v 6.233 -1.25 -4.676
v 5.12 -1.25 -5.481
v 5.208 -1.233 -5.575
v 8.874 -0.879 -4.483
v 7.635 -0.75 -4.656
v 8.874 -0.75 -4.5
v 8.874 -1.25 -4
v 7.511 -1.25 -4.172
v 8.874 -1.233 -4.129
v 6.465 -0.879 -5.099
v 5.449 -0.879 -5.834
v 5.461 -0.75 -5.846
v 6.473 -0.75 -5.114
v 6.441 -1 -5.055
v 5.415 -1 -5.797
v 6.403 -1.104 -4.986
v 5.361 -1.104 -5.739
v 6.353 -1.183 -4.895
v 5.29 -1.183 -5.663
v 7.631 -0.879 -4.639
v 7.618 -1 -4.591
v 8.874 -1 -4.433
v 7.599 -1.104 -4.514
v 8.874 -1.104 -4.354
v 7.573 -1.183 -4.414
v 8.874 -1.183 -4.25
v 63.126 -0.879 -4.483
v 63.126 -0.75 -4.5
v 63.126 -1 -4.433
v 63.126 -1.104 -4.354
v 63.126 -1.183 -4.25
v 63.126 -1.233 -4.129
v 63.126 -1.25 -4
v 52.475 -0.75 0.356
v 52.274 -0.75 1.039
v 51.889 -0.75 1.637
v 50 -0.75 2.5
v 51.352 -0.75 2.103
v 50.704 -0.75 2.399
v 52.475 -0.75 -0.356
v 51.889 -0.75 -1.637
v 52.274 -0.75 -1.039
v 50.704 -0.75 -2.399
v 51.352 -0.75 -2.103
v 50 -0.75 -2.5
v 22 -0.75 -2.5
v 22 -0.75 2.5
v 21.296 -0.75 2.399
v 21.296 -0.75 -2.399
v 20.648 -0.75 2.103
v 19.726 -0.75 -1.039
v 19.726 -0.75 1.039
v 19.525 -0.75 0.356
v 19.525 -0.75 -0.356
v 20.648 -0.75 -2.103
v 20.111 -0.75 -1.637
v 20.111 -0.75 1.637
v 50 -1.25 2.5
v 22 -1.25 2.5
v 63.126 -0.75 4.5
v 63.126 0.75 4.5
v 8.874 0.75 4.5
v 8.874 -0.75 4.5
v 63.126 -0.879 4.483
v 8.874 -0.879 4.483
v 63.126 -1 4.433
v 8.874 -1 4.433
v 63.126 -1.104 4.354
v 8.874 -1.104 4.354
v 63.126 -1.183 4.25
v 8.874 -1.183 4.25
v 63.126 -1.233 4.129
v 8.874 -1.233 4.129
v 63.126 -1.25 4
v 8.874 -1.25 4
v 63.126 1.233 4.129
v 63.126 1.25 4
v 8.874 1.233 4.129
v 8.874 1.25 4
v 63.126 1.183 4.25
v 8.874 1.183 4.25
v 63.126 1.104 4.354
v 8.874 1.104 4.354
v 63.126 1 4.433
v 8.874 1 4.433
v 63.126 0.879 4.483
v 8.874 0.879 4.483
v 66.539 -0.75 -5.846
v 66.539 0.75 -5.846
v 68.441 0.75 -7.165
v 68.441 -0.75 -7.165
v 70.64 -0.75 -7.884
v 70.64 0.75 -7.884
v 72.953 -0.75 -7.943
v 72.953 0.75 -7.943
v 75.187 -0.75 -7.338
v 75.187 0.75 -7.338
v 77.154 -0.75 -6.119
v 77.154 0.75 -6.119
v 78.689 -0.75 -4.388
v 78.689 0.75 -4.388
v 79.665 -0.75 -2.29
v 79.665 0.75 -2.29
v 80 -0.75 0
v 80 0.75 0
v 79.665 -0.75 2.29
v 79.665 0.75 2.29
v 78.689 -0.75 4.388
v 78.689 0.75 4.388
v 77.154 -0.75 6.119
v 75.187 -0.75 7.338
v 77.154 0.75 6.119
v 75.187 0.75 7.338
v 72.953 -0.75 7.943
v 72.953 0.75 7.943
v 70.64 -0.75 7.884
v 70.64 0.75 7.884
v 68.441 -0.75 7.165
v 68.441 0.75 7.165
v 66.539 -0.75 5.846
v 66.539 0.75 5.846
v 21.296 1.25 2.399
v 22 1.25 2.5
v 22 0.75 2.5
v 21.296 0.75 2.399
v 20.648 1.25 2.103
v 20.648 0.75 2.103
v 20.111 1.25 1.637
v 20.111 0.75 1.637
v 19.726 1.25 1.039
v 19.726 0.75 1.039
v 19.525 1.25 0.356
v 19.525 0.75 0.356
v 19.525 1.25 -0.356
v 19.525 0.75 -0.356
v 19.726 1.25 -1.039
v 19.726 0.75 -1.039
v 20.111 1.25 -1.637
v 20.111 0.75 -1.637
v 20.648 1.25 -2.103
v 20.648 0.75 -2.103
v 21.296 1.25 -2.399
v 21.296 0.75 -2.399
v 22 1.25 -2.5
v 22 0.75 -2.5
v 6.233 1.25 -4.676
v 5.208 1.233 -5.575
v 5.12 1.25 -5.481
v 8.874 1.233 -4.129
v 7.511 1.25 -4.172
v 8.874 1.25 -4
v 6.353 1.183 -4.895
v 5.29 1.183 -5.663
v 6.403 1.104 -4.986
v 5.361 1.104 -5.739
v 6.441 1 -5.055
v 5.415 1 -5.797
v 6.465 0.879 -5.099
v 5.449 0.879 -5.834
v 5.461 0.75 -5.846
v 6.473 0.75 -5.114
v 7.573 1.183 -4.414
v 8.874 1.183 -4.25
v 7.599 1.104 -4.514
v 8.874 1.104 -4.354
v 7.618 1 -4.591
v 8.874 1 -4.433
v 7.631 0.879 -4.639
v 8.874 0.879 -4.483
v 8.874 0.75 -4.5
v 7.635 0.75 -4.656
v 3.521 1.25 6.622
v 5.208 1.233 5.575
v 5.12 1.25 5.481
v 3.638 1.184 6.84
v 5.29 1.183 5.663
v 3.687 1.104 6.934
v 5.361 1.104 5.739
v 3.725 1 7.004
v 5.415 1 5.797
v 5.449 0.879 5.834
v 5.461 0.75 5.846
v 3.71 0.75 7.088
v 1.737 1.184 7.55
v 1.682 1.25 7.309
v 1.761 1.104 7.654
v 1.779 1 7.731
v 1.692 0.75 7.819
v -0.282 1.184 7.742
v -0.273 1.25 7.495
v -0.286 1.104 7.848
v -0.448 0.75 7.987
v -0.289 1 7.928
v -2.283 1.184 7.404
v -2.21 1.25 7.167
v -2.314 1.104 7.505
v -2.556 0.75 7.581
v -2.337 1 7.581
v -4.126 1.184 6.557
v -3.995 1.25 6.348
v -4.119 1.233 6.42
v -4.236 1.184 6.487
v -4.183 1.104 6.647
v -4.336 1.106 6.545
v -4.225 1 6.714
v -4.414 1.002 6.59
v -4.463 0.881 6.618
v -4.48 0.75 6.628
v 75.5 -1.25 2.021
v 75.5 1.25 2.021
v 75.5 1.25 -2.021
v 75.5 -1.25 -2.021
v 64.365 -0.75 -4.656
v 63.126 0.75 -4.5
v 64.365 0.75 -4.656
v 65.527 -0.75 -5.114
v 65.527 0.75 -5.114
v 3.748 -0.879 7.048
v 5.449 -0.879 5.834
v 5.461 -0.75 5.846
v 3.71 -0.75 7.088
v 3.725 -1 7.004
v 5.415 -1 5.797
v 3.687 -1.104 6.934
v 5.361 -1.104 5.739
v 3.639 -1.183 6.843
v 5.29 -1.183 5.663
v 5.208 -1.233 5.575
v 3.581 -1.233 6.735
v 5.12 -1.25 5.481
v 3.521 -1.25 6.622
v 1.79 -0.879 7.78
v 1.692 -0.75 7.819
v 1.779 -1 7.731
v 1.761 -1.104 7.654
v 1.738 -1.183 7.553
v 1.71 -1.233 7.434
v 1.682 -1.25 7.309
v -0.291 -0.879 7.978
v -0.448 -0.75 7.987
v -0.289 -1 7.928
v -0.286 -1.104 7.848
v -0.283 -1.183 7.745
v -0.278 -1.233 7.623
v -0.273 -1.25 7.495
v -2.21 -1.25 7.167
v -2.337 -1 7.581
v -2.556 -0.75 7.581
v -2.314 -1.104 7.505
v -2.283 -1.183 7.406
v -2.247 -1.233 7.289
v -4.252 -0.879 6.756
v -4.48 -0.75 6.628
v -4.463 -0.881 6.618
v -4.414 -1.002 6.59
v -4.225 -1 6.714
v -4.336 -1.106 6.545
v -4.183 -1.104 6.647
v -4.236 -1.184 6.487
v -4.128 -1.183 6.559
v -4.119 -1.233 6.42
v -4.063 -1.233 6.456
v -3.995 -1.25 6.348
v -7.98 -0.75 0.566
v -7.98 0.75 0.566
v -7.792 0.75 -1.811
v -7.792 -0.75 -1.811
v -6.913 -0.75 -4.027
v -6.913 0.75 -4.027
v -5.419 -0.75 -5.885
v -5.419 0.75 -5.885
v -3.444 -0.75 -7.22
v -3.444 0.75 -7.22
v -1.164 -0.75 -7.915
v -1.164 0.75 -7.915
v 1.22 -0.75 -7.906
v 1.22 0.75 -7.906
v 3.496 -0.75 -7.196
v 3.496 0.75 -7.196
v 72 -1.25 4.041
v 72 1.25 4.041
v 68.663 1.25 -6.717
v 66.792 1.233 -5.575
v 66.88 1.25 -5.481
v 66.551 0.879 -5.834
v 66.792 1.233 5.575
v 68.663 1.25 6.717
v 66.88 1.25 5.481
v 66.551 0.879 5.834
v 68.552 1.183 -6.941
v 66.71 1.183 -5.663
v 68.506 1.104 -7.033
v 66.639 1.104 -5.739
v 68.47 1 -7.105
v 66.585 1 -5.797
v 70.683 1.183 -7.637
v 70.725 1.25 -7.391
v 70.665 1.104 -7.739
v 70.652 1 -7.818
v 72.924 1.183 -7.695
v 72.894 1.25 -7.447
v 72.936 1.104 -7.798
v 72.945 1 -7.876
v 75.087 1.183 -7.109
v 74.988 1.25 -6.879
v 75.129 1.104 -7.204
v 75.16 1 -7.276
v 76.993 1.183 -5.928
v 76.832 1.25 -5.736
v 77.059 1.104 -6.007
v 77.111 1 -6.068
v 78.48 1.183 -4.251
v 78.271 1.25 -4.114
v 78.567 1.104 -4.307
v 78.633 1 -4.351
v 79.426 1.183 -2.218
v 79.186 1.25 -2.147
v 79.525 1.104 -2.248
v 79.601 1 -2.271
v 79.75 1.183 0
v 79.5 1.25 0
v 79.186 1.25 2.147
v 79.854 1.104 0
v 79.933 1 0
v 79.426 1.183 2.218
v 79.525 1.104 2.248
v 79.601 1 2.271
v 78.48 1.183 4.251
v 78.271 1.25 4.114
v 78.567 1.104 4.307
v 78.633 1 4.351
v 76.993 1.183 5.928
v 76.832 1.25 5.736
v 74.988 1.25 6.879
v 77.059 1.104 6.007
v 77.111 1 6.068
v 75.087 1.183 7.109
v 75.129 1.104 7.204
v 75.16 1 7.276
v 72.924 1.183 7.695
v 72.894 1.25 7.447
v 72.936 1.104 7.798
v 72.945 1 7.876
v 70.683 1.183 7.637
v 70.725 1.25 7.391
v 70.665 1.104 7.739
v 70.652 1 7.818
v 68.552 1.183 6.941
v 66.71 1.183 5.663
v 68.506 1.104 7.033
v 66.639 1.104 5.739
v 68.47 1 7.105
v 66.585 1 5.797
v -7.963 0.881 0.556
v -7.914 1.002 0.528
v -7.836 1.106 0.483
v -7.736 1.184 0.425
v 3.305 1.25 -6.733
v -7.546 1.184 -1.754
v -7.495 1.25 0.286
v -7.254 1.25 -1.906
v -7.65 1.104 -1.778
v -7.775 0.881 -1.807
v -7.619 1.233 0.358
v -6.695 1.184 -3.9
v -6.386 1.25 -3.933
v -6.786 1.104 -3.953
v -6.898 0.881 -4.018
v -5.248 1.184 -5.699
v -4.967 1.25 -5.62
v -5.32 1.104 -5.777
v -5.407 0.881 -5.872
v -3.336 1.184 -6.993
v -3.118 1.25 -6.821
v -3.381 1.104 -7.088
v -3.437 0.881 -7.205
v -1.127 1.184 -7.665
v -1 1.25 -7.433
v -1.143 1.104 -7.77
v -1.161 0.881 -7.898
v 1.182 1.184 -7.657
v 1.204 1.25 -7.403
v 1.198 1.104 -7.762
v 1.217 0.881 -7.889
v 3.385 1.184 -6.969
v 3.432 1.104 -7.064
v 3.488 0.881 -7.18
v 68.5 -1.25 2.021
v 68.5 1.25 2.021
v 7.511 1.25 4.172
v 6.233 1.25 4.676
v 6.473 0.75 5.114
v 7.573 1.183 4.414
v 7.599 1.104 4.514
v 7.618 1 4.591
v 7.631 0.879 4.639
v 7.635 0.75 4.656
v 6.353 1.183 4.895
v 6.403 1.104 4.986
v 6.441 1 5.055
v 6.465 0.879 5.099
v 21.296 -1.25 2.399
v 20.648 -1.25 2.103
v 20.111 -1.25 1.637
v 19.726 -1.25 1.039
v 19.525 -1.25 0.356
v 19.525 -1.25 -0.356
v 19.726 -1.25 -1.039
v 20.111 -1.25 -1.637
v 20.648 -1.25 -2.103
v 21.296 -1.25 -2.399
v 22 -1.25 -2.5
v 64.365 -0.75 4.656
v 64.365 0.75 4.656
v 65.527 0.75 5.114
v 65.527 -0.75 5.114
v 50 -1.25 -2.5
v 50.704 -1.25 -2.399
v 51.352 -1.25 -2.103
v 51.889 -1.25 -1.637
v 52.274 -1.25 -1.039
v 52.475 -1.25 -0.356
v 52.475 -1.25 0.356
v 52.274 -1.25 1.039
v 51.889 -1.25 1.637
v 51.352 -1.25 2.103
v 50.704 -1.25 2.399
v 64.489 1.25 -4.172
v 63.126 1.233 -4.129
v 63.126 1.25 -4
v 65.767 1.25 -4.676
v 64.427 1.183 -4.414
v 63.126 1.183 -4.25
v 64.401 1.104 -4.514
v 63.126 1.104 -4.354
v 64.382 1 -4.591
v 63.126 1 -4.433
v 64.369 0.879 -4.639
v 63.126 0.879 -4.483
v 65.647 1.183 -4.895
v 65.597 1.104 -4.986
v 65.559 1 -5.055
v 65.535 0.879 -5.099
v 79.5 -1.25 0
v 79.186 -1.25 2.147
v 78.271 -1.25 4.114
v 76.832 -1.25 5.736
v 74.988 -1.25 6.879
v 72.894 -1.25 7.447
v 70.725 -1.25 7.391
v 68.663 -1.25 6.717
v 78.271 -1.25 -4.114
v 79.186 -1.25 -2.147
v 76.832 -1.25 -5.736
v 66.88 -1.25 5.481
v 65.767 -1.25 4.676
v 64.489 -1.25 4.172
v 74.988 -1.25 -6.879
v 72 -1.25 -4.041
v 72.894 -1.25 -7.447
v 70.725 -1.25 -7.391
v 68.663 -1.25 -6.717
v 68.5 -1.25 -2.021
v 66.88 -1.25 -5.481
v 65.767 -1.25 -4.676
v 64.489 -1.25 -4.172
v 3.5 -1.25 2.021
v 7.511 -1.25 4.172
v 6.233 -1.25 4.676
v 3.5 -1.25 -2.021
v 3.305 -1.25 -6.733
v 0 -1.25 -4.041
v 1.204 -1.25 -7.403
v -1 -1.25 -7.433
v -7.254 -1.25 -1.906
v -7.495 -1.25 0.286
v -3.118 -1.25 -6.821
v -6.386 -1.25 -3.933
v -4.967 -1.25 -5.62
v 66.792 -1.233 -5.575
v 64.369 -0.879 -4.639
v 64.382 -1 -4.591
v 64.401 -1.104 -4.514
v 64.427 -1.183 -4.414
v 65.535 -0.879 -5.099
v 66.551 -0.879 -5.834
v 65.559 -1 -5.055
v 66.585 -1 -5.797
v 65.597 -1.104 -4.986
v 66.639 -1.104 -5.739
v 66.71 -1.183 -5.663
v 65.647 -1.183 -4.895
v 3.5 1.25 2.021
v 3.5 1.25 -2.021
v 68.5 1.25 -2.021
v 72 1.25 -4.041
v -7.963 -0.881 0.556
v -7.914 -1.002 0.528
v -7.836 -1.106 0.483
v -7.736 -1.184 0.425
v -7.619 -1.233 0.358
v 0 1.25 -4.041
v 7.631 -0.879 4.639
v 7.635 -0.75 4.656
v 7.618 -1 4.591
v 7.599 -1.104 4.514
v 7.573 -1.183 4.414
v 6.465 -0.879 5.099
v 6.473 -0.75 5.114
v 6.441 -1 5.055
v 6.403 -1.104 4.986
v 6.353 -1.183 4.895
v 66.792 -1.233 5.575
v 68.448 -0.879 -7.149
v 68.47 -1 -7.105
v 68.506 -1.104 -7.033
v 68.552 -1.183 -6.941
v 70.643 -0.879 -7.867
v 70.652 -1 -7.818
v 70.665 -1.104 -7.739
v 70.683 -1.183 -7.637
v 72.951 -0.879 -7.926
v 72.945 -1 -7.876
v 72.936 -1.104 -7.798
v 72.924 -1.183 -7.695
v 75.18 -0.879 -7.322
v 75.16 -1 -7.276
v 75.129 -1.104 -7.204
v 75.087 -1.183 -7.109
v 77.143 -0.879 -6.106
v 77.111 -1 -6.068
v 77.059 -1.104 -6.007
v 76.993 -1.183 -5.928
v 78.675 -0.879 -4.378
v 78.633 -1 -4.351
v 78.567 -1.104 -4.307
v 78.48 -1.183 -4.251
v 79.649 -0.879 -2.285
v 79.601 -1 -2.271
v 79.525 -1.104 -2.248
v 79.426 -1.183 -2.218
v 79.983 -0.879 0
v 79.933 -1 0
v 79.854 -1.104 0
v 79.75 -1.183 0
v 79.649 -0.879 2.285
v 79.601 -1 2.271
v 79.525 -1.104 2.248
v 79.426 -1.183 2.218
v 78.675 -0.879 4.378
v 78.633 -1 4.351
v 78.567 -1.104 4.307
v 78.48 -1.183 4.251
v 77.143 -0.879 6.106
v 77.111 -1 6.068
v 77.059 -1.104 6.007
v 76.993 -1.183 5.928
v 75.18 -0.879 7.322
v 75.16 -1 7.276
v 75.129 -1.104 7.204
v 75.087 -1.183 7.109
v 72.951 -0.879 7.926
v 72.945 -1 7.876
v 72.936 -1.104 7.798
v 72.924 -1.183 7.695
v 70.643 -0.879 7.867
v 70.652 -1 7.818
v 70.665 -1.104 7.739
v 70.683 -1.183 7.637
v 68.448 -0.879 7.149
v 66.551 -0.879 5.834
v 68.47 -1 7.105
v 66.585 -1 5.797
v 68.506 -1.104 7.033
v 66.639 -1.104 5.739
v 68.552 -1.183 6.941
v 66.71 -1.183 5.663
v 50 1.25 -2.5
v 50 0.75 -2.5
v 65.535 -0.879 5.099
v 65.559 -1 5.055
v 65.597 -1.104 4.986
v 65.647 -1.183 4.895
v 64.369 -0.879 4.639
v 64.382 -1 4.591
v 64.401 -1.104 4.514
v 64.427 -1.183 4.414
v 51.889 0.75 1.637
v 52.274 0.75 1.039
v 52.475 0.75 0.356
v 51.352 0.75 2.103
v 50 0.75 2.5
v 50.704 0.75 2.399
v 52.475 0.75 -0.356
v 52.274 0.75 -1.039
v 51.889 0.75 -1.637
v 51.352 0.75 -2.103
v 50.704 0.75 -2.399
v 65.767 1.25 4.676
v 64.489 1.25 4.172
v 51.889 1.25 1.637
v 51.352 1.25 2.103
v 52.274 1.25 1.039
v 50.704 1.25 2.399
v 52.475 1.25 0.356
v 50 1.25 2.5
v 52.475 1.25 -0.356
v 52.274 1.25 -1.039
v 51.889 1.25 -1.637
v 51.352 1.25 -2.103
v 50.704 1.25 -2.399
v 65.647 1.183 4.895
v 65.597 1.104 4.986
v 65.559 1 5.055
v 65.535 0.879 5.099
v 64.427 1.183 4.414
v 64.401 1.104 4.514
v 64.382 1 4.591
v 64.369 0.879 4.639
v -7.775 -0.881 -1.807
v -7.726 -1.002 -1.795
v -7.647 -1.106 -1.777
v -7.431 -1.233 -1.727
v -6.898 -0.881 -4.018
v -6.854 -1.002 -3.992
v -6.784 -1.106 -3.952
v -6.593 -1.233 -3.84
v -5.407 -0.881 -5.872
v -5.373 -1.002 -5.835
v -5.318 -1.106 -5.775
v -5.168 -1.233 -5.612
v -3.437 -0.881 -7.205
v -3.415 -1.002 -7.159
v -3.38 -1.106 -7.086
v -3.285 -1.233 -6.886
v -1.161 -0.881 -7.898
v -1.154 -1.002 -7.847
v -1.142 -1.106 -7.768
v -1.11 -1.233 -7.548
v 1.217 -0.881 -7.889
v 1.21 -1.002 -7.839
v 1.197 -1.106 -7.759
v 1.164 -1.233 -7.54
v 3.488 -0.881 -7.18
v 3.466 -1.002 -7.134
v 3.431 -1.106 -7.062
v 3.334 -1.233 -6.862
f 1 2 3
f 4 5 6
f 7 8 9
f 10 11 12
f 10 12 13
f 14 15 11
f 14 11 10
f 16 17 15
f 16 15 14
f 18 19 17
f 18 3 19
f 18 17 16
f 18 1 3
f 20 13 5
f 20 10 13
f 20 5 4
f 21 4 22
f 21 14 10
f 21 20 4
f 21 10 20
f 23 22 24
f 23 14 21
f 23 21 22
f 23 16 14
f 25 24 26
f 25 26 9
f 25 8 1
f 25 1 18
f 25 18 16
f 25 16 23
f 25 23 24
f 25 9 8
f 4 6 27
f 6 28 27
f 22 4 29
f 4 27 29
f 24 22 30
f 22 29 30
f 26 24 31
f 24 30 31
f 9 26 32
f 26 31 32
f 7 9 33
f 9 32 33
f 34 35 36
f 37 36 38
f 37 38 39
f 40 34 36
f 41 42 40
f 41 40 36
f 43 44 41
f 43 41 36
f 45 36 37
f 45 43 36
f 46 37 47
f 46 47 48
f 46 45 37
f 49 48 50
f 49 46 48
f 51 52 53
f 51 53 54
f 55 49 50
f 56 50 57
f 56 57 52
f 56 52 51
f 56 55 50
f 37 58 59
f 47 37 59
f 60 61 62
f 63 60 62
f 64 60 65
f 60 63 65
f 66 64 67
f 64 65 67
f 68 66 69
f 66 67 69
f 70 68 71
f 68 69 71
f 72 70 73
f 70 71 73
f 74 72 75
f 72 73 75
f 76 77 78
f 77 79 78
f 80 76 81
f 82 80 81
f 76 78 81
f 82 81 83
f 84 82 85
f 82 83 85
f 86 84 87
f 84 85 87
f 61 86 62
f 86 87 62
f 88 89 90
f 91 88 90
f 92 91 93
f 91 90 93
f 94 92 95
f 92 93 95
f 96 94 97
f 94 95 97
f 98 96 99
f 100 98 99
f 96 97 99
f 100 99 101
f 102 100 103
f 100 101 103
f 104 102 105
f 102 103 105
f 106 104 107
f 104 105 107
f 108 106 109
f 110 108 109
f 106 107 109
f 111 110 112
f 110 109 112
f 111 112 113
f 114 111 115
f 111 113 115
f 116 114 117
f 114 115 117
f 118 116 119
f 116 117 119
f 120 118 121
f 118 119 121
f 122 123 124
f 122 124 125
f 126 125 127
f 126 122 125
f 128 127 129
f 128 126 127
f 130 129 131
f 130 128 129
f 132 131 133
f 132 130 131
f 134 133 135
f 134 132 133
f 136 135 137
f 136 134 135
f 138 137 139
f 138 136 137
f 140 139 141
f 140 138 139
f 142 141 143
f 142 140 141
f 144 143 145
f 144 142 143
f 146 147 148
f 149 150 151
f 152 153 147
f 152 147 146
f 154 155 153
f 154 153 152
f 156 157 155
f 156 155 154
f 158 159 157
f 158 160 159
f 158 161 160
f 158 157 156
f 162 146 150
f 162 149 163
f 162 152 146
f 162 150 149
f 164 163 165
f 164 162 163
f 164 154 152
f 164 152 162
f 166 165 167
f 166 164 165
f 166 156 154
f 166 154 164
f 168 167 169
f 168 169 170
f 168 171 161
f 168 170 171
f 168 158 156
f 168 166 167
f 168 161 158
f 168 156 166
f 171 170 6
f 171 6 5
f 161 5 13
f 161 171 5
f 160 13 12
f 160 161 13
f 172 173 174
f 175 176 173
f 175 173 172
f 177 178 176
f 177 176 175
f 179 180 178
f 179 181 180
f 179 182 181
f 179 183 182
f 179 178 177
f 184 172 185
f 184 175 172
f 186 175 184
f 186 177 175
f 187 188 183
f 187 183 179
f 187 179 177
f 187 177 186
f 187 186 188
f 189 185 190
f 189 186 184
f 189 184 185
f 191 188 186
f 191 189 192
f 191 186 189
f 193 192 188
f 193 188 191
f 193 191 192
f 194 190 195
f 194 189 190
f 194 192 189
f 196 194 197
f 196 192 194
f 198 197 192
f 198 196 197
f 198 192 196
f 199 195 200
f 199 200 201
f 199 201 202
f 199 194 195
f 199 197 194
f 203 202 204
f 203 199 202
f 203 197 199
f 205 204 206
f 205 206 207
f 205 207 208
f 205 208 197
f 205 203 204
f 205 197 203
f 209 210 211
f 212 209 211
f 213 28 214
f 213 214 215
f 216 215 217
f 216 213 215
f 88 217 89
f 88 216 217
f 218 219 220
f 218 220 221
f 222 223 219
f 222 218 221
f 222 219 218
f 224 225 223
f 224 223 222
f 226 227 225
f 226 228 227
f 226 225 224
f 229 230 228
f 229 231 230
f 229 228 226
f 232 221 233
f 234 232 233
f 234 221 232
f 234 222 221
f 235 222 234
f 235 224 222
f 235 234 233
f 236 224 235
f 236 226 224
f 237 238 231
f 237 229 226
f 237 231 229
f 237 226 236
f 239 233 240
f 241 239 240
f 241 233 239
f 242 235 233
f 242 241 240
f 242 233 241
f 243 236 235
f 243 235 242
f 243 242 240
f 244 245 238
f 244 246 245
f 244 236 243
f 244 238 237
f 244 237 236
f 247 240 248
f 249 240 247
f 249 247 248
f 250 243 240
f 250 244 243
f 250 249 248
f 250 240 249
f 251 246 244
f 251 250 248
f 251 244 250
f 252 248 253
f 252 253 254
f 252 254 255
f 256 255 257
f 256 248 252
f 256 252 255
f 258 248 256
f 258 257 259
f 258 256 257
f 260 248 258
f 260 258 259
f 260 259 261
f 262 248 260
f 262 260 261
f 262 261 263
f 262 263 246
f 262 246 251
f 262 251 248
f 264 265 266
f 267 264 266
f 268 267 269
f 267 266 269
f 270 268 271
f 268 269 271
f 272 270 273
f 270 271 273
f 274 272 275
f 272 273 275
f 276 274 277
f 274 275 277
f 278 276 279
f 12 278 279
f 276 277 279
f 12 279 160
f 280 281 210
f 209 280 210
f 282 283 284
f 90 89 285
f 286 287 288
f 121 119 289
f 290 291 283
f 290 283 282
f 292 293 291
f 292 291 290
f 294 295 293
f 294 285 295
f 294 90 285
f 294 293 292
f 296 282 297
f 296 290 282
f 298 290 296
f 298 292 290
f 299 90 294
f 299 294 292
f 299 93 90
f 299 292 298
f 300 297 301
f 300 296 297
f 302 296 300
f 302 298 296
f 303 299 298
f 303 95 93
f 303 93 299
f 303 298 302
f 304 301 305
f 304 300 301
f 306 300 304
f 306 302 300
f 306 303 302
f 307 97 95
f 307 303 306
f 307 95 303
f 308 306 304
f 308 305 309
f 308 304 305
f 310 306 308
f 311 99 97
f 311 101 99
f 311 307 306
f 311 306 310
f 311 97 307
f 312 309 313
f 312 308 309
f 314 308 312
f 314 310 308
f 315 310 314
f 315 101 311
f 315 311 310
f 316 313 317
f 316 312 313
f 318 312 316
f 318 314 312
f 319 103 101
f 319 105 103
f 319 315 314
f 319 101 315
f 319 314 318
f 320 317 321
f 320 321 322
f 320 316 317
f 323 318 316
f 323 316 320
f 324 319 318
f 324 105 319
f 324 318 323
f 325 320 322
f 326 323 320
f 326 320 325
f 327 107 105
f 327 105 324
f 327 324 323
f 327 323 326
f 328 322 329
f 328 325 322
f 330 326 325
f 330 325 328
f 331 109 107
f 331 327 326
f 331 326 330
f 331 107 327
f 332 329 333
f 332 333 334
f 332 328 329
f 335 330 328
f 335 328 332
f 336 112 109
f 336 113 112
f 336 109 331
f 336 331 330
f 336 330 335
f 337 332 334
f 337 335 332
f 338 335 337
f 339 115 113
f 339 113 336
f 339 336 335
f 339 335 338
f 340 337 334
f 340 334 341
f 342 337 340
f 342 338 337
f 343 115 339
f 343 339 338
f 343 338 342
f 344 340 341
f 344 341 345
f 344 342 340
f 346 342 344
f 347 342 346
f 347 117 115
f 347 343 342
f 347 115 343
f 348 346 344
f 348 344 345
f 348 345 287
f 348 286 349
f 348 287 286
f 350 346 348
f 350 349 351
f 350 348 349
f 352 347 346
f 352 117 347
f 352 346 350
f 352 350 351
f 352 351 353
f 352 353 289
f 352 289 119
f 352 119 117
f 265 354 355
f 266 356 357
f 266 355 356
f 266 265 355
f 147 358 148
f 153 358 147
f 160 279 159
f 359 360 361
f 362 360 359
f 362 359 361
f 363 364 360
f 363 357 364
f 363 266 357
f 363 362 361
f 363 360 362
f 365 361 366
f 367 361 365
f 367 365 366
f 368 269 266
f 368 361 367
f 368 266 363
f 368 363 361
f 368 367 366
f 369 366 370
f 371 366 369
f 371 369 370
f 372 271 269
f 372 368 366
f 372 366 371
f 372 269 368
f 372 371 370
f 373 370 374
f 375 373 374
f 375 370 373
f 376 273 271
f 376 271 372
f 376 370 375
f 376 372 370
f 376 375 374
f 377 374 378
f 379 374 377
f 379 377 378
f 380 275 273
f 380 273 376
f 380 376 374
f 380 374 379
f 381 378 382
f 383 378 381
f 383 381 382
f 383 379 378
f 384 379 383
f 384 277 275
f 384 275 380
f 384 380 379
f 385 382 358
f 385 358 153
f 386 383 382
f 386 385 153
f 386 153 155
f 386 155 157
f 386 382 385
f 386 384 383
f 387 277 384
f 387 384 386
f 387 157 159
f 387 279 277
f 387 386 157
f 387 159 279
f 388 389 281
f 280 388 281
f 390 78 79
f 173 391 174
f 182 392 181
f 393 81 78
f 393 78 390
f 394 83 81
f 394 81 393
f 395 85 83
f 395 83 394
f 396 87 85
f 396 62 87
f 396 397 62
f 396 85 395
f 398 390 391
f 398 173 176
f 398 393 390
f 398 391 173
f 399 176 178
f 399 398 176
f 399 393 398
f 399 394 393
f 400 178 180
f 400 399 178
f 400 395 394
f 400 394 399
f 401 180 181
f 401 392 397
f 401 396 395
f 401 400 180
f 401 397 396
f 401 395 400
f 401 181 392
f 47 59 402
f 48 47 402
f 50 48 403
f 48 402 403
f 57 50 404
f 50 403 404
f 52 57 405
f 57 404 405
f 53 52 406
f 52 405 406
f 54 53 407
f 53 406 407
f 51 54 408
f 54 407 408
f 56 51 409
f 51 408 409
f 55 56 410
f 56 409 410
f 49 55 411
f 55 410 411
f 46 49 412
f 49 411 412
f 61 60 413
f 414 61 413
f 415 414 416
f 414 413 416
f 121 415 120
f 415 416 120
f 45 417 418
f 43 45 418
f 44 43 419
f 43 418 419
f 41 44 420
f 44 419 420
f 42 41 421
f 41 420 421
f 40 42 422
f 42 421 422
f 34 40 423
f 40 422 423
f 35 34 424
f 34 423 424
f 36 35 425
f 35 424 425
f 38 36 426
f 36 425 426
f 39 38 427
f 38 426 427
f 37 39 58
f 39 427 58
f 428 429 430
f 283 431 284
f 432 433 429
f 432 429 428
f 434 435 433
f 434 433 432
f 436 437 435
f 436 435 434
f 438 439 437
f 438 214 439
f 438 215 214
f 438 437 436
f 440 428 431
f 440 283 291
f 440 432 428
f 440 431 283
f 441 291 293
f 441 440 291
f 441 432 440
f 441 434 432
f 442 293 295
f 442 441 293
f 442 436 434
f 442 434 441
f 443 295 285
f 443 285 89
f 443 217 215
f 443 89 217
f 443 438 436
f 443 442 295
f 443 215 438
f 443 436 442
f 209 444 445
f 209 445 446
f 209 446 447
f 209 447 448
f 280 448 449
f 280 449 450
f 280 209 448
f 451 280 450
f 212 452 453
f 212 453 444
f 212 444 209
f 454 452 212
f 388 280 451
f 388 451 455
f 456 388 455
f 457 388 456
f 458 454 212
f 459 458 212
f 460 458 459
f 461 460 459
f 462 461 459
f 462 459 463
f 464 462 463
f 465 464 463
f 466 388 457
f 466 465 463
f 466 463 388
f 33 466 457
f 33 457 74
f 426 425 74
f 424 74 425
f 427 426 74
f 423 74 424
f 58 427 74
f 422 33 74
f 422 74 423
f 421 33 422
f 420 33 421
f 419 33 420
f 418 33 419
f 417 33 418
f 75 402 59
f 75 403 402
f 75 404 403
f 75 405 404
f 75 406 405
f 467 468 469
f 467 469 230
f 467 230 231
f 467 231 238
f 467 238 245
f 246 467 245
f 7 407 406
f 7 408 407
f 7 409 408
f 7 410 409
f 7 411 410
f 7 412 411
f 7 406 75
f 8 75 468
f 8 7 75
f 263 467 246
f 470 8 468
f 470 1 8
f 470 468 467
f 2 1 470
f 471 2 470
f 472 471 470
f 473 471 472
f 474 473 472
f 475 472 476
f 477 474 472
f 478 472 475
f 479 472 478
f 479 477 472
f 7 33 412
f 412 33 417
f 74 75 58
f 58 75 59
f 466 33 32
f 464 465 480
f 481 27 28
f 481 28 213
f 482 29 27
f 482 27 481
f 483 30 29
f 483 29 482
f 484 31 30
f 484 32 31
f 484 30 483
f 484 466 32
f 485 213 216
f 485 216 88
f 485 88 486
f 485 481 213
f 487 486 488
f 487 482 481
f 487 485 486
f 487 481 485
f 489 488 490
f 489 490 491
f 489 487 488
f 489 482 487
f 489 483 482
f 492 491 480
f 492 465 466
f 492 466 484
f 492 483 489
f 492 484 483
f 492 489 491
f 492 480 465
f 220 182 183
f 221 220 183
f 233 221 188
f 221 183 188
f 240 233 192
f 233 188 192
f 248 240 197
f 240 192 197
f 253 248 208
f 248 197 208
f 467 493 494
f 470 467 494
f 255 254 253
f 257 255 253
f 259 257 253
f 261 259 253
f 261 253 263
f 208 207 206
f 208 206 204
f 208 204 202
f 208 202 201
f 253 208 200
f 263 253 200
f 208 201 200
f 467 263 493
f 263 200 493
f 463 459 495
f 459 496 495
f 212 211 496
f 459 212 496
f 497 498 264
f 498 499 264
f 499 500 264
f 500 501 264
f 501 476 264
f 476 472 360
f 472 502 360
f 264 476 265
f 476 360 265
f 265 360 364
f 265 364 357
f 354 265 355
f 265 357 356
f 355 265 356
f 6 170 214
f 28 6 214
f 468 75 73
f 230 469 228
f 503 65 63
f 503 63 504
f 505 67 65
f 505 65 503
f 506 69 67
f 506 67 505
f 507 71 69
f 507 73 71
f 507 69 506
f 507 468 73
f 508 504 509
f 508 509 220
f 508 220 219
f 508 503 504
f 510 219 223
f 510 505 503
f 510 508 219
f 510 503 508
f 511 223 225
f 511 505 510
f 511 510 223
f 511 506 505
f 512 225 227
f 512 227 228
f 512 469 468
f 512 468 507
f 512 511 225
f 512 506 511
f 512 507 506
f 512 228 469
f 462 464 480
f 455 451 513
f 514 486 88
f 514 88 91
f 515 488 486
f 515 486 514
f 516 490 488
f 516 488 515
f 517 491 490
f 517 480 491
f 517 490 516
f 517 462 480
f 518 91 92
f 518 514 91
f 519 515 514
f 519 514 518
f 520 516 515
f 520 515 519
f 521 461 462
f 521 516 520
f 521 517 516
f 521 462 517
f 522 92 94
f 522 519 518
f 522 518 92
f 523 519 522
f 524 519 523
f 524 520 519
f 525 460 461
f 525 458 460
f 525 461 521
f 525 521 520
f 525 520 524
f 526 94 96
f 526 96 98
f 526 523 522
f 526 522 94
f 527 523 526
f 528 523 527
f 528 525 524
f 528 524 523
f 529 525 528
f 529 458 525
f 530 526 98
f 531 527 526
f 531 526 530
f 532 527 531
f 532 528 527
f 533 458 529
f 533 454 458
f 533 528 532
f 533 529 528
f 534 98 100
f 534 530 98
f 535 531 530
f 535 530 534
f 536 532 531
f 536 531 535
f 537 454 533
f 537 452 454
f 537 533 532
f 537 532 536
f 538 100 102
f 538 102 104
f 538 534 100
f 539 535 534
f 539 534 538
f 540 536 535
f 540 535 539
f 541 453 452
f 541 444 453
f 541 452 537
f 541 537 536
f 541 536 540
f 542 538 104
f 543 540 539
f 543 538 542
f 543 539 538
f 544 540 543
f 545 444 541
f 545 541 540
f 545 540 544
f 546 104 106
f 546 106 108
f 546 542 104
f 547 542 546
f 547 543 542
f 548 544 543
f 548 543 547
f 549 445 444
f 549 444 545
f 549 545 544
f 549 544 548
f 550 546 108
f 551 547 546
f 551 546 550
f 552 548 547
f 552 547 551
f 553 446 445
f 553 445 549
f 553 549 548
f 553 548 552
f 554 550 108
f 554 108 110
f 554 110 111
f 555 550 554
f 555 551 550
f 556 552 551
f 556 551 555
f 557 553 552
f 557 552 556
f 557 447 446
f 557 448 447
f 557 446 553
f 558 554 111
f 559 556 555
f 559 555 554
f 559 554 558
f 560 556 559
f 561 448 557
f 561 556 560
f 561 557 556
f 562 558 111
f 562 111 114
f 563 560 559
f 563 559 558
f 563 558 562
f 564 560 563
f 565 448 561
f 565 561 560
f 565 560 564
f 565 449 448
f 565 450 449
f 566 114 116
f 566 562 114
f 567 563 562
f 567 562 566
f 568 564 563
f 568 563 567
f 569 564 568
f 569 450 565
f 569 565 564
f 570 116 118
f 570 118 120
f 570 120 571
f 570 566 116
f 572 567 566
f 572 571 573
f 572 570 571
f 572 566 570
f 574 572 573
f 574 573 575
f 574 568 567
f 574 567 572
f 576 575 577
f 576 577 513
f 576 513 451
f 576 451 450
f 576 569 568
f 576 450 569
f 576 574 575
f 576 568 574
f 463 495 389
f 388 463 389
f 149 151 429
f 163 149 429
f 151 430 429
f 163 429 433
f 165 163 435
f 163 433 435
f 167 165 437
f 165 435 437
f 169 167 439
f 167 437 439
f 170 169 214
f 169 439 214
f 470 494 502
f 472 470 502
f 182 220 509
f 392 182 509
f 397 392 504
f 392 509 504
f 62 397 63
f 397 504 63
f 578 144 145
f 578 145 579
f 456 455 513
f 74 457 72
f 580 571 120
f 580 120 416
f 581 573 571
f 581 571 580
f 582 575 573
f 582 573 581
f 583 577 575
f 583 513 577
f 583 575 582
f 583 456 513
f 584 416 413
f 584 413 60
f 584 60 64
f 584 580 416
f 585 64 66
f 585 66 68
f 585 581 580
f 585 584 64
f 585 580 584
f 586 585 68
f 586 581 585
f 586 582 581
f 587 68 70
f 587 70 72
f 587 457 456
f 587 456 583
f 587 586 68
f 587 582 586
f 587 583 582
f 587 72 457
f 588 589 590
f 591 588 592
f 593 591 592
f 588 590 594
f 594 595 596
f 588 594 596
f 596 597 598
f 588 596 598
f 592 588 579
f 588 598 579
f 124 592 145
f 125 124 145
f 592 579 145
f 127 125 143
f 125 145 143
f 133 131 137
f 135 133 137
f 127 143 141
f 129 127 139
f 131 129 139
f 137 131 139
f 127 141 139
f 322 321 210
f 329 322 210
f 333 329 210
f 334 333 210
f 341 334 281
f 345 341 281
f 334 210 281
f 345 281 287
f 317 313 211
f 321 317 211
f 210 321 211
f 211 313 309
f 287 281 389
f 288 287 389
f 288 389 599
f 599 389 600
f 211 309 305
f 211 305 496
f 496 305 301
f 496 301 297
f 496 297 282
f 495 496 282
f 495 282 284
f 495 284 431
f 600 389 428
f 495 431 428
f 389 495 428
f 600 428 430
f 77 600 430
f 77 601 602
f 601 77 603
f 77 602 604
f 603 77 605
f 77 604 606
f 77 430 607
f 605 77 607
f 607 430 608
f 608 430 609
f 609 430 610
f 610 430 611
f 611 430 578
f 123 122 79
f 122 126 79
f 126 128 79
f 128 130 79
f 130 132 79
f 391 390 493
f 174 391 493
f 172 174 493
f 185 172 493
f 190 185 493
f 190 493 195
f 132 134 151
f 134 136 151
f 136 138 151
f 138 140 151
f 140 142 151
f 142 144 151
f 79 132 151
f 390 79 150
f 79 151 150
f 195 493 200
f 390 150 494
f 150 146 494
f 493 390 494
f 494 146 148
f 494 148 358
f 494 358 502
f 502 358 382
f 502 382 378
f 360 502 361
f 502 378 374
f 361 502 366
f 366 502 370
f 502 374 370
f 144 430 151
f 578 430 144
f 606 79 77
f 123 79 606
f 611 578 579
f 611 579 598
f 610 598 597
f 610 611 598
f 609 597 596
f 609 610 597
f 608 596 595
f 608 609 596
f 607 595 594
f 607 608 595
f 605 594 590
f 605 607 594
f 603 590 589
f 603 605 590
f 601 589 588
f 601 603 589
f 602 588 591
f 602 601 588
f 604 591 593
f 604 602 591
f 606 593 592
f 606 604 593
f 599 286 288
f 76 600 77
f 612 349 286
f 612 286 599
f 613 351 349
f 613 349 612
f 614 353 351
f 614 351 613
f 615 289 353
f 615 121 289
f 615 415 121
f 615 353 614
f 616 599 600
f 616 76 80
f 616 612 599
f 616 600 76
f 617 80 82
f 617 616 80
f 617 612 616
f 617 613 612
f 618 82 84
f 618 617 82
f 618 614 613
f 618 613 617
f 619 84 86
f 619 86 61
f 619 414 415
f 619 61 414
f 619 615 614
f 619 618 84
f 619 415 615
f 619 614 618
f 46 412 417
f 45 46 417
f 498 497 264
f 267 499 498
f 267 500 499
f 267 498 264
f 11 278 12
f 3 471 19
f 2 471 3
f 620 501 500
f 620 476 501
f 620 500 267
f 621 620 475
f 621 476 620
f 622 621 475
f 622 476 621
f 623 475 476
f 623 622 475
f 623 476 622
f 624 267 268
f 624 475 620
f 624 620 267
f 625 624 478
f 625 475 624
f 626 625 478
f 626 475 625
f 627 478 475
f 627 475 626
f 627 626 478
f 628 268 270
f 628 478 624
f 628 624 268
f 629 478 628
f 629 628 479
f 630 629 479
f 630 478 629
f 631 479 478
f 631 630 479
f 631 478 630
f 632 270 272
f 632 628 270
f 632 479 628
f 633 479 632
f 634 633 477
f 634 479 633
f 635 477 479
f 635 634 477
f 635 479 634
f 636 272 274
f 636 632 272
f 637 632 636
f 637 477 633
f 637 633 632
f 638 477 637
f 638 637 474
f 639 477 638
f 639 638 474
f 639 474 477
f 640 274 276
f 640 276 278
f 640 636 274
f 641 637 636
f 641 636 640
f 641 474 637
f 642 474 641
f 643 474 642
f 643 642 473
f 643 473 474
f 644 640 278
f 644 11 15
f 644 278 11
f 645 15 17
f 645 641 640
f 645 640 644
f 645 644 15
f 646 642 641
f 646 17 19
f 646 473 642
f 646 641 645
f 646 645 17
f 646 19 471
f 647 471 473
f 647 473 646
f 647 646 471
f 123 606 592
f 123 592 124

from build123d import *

# Parameters (mm, degrees)
BOSS_EXTRUDE1_DEPTH = 1.25
FILLET1_R           = 5
FILLET2_R           = 0.5
CUT_EXTRUDE1_DEPTH  = 0.5


with BuildPart() as part:
    # Sketch1 → Boss-Extrude1 (new body, symmetric)
    with BuildSketch(Plane(origin=(0, 0, 0), x_dir=(1, 0, 0), z_dir=(0, 1, 0))):
        with BuildLine():
            Line((6.614378278, 4.5), (65.385621722, 4.5))
            ThreePointArc((65.385621722, 4.5), (80, 0), (65.385621722, -4.5))
            Line((65.385621722, -4.5), (6.614378278, -4.5))
            ThreePointArc((6.614378278, -4.5), (1.506978128, -7.856781588), (-4.479967897, -6.627962556))
            Line((-4.479967897, -6.627962556), (3.5, -2.020725942))
            Line((3.5, -2.020725942), (3.5, 2.020725942))
            Line((3.5, 2.020725942), (0, 4.041451884))
            Line((0, 4.041451884), (-7.979967897, -0.565784729))
            ThreePointArc((-7.979967897, -0.565784729), (-2.623309452, 7.557661511), (6.614378278, 4.5))
        make_face()
        Polygon((72, 4.041451884), (68.5, 2.020725942), (68.5, -2.020725942), (72, -4.041451884), (75.5, -2.020725942), (75.5, 2.020725942), align=None, mode=Mode.SUBTRACT)
    extrude(amount=BOSS_EXTRUDE1_DEPTH, both=True)

    # Fillet1
    fillet1_edges = [part.edges().sort_by_distance(p)[0] for p in [
        (6.614378278, 0, -4.5),
        (65.385621722, 0, -4.5),
        (65.385621722, 0, 4.5),
        (6.614378278, 0, 4.5),
    ]]
    fillet(fillet1_edges, radius=FILLET1_R)

    # Fillet2
    fillet2_edges = [part.edges().sort_by_distance(p)[0] for p in [
        (0.627224524, 1.25, 7.975373935),
        (36, -1.25, -4.5),
        (36, 1.25, -4.5),
        (80, -1.25, 0),
        (80, 1.25, 0),
        (36, -1.25, 4.5),
        (36, 1.25, 4.5),
        (-3.444494595, -1.25, -7.220488694),
        (-3.444494595, 1.25, -7.220488694),
        (64.96037879, -1.25, -4.848697453),
        (64.96037879, 1.25, -4.848697453),
        (64.96037879, -1.25, 4.848697453),
        (64.96037879, 1.25, 4.848697453),
        (7.03962121, -1.25, 4.848697453),
        (7.03962121, 1.25, 4.848697453),
        (7.03962121, -1.25, -4.848697453),
        (7.03962121, 1.25, -4.848697453),
        (0.627224524, -1.25, 7.975373935),
    ]]
    fillet(fillet2_edges, radius=FILLET2_R)

    # Sketch2 → Cut-Extrude1 (cut)
    with BuildSketch(Plane(origin=(0, 1.25, 0), x_dir=(1, 0, 0), z_dir=(0, 1, 0))):
        with BuildLine():
            Line((22, 2.5), (50, 2.5))
            ThreePointArc((50, 2.5), (52.5, 0), (50, -2.5))
            Line((50, -2.5), (22, -2.5))
            ThreePointArc((22, -2.5), (19.5, 0), (22, 2.5))
        make_face()
    cut_extrude1 = extrude(amount=-CUT_EXTRUDE1_DEPTH, mode=Mode.SUBTRACT)

    # Mirror1: Cut-Extrude1 across plane
    add(cut_extrude1.mirror(Plane.ZX), mode=Mode.SUBTRACT)


solid = part.part
